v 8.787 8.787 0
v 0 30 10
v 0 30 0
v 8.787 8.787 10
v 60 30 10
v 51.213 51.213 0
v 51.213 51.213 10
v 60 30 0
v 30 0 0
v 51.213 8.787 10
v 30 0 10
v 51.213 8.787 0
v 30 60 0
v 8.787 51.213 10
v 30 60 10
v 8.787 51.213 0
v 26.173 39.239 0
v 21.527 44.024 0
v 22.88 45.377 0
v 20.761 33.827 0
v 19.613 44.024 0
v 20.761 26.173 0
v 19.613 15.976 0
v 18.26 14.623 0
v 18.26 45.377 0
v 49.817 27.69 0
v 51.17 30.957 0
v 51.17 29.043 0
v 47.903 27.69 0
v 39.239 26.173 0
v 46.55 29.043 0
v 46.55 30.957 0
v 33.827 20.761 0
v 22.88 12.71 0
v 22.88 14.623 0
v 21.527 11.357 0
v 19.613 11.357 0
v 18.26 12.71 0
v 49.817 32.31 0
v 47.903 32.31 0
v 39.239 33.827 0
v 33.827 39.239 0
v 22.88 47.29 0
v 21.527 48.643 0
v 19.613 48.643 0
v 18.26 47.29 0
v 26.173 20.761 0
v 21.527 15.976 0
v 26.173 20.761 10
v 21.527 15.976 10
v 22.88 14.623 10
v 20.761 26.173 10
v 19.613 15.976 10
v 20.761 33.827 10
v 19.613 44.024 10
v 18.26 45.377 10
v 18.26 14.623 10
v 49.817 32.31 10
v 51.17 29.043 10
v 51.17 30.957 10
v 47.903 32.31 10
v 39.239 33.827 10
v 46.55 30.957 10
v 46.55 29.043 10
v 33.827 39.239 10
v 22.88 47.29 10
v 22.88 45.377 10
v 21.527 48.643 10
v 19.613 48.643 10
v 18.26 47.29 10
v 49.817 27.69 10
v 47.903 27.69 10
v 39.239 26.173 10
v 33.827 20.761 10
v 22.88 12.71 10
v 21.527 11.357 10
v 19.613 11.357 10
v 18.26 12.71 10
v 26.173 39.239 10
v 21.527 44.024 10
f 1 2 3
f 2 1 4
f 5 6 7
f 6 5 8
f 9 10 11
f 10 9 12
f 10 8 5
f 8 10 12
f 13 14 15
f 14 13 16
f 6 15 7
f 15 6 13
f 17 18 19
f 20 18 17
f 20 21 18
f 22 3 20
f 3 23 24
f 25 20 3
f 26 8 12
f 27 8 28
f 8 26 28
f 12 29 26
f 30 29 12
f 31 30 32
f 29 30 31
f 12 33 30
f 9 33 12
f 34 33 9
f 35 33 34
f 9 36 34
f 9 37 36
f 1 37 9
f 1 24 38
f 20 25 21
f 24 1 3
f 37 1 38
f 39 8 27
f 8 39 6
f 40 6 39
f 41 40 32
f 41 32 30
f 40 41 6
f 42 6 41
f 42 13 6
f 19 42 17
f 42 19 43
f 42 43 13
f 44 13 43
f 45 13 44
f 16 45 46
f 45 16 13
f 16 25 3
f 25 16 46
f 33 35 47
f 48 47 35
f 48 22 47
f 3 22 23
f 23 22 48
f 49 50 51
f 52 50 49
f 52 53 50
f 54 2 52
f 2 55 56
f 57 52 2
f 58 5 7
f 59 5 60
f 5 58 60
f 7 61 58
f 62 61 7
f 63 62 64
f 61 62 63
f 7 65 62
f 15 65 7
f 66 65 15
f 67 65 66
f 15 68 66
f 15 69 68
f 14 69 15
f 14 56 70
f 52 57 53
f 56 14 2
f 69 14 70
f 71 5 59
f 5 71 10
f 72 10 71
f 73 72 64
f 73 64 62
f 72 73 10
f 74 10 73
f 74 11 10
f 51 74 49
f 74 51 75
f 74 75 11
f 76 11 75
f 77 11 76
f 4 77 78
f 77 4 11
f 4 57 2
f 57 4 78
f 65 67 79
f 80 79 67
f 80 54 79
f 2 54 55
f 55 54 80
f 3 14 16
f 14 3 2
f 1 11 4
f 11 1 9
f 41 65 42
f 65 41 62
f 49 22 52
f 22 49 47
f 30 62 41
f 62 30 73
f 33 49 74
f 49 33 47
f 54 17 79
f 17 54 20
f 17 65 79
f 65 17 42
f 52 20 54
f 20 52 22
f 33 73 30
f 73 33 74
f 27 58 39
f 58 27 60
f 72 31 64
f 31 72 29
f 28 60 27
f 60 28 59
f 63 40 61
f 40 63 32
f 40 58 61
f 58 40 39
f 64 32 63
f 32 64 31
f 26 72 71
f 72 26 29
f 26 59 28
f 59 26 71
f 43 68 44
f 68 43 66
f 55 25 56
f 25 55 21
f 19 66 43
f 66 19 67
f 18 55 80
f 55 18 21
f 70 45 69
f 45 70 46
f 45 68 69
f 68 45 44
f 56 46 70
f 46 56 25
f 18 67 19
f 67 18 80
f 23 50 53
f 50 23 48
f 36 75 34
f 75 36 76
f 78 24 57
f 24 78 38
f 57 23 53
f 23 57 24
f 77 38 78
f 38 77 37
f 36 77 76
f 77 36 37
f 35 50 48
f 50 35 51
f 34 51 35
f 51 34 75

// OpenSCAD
$fn = 32;

// ----------------------------------------------------------------------
// Polygon plate: 8-gon R30, 3 bolt windows
// ----------------------------------------------------------------------

// --- parameters (mm) ---
sides = 8;                // number of polygon sides
plate_r = 30;             // circumscribed radius of the polygon
bore_r = 10;              // centre bore radius
bolts = 3;                // number of bolt windows
ring_r = 18.86;           // bolt-circle radius
bolt_r = 2.5;             // bolt window radius
plate_t = 10;             // plate thickness, Z (extrusion height)

plate_d = 2 * plate_r;  // circumscribed diameter
bore_d = 2 * bore_r;  // centre bore diameter
bolt_d = 2 * bolt_r;  // bolt window diameter
ring_d = 2 * ring_r;  // bolt-circle diameter

profile = [[60, 30], [51.213, 51.213], [30, 60], [8.787, 51.213], [0, 30], [8.787, 8.787], [30, 0], [51.213, 8.787]];  // primary outline, 8 points, counter clockwise
void_1 = [[39.239, 33.827], [33.827, 39.239], [26.173, 39.239], [20.761, 33.827], [20.761, 26.173], [26.173, 20.761], [33.827, 20.761], [39.239, 26.173]];  // centre bore, 8 points
void_2 = [[51.17, 30.957], [49.817, 32.31], [47.903, 32.31], [46.55, 30.957], [46.55, 29.043], [47.903, 27.69], [49.817, 27.69], [51.17, 29.043]];  // bolt window 1, 8 points
void_3 = [[22.88, 47.29], [21.527, 48.643], [19.613, 48.643], [18.26, 47.29], [18.26, 45.377], [19.613, 44.024], [21.527, 44.024], [22.88, 45.377]];  // bolt window 2, 8 points
void_4 = [[22.88, 14.623], [21.527, 15.976], [19.613, 15.976], [18.26, 14.623], [18.26, 12.71], [19.613, 11.357], [21.527, 11.357], [22.88, 12.71]];  // bolt window 3, 8 points

// --- the one profile operation ---
difference() {
  linear_extrude(height = plate_t) polygon(points = profile);
  translate([0, 0, -1])
    linear_extrude(height = plate_t + 2) polygon(points = void_1);
  translate([0, 0, -1])
    linear_extrude(height = plate_t + 2) polygon(points = void_2);
  translate([0, 0, -1])
    linear_extrude(height = plate_t + 2) polygon(points = void_3);
  translate([0, 0, -1])
    linear_extrude(height = plate_t + 2) polygon(points = void_4);
}
